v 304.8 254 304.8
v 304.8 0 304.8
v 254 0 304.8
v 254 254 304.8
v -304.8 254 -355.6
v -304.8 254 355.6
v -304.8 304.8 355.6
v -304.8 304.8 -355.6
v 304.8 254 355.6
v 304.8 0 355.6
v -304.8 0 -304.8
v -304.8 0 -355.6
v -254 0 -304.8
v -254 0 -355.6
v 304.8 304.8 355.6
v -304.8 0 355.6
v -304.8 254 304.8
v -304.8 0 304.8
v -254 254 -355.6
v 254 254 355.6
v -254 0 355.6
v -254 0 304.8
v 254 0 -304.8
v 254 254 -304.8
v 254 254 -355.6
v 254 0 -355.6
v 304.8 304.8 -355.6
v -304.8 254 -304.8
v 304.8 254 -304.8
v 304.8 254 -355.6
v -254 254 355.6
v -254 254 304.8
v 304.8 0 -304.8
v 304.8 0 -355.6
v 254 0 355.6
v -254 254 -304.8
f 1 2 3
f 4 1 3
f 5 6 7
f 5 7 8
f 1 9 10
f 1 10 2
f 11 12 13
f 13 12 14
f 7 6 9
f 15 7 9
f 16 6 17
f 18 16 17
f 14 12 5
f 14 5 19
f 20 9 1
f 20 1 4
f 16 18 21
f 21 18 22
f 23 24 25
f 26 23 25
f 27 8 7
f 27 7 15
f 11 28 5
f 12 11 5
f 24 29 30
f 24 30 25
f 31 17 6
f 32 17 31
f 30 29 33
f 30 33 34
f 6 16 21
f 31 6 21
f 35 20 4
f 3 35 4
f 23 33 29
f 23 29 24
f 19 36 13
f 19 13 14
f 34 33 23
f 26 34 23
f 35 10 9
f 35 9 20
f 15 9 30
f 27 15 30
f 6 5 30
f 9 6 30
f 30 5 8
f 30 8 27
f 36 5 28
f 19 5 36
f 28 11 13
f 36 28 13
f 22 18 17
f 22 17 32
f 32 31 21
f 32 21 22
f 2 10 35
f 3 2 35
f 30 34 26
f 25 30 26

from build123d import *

# Parameters (mm, degrees)
SKETCH1_W             = 50.8
SKETCH1_H             = 50.8
BOSS_EXTRUDE1_DEPTH   = 254
BOSS_EXTRUDE1_2_DEPTH = 254
SKETCH2_W             = 609.6
SKETCH2_H             = 711.2
BOSS_EXTRUDE2_DEPTH   = 50.8


with BuildPart() as part:
    # Sketch1 → Boss-Extrude1 (new body)
    with BuildSketch(Plane(origin=(0, 0, 0), x_dir=(1, 0, 0), z_dir=(0, 1, 0))):
        with Locations((-279.4, 330.2)):
            Rectangle(SKETCH1_W, SKETCH1_H)
    extrude(amount=BOSS_EXTRUDE1_DEPTH)


with BuildPart() as body_2:
    # Sketch1 → Boss-Extrude1 2 (new body)
    with BuildSketch(Plane(origin=(0, 0, 0), x_dir=(1, 0, 0), z_dir=(0, 1, 0))):
        with Locations((-279.4, -330.2)):
            Rectangle(SKETCH1_W, SKETCH1_H)
    extrude(amount=BOSS_EXTRUDE1_2_DEPTH)


with BuildPart() as body_3:
    # Mirror4: mirrored copy
    add(part.part.mirror(Plane(origin=(0, 0, 0), x_dir=(0, 0, 1), z_dir=(1, 0, 0))))


with BuildPart() as body_4:
    # Mirror4 2: mirrored copy
    add(body_2.part.mirror(Plane(origin=(0, 0, 0), x_dir=(0, 0, 1), z_dir=(1, 0, 0))))


with BuildPart() as body_5:
    # Sketch2 → Boss-Extrude2 (new body)
    with BuildSketch(Plane(origin=(0, 254, 0), x_dir=(1, 0, 0), z_dir=(0, 1, 0))):
        Rectangle(SKETCH2_W, SKETCH2_H)
    extrude(amount=BOSS_EXTRUDE2_DEPTH)


solid = Compound([part.part, body_2.part, body_3.part, body_4.part, body_5.part])
